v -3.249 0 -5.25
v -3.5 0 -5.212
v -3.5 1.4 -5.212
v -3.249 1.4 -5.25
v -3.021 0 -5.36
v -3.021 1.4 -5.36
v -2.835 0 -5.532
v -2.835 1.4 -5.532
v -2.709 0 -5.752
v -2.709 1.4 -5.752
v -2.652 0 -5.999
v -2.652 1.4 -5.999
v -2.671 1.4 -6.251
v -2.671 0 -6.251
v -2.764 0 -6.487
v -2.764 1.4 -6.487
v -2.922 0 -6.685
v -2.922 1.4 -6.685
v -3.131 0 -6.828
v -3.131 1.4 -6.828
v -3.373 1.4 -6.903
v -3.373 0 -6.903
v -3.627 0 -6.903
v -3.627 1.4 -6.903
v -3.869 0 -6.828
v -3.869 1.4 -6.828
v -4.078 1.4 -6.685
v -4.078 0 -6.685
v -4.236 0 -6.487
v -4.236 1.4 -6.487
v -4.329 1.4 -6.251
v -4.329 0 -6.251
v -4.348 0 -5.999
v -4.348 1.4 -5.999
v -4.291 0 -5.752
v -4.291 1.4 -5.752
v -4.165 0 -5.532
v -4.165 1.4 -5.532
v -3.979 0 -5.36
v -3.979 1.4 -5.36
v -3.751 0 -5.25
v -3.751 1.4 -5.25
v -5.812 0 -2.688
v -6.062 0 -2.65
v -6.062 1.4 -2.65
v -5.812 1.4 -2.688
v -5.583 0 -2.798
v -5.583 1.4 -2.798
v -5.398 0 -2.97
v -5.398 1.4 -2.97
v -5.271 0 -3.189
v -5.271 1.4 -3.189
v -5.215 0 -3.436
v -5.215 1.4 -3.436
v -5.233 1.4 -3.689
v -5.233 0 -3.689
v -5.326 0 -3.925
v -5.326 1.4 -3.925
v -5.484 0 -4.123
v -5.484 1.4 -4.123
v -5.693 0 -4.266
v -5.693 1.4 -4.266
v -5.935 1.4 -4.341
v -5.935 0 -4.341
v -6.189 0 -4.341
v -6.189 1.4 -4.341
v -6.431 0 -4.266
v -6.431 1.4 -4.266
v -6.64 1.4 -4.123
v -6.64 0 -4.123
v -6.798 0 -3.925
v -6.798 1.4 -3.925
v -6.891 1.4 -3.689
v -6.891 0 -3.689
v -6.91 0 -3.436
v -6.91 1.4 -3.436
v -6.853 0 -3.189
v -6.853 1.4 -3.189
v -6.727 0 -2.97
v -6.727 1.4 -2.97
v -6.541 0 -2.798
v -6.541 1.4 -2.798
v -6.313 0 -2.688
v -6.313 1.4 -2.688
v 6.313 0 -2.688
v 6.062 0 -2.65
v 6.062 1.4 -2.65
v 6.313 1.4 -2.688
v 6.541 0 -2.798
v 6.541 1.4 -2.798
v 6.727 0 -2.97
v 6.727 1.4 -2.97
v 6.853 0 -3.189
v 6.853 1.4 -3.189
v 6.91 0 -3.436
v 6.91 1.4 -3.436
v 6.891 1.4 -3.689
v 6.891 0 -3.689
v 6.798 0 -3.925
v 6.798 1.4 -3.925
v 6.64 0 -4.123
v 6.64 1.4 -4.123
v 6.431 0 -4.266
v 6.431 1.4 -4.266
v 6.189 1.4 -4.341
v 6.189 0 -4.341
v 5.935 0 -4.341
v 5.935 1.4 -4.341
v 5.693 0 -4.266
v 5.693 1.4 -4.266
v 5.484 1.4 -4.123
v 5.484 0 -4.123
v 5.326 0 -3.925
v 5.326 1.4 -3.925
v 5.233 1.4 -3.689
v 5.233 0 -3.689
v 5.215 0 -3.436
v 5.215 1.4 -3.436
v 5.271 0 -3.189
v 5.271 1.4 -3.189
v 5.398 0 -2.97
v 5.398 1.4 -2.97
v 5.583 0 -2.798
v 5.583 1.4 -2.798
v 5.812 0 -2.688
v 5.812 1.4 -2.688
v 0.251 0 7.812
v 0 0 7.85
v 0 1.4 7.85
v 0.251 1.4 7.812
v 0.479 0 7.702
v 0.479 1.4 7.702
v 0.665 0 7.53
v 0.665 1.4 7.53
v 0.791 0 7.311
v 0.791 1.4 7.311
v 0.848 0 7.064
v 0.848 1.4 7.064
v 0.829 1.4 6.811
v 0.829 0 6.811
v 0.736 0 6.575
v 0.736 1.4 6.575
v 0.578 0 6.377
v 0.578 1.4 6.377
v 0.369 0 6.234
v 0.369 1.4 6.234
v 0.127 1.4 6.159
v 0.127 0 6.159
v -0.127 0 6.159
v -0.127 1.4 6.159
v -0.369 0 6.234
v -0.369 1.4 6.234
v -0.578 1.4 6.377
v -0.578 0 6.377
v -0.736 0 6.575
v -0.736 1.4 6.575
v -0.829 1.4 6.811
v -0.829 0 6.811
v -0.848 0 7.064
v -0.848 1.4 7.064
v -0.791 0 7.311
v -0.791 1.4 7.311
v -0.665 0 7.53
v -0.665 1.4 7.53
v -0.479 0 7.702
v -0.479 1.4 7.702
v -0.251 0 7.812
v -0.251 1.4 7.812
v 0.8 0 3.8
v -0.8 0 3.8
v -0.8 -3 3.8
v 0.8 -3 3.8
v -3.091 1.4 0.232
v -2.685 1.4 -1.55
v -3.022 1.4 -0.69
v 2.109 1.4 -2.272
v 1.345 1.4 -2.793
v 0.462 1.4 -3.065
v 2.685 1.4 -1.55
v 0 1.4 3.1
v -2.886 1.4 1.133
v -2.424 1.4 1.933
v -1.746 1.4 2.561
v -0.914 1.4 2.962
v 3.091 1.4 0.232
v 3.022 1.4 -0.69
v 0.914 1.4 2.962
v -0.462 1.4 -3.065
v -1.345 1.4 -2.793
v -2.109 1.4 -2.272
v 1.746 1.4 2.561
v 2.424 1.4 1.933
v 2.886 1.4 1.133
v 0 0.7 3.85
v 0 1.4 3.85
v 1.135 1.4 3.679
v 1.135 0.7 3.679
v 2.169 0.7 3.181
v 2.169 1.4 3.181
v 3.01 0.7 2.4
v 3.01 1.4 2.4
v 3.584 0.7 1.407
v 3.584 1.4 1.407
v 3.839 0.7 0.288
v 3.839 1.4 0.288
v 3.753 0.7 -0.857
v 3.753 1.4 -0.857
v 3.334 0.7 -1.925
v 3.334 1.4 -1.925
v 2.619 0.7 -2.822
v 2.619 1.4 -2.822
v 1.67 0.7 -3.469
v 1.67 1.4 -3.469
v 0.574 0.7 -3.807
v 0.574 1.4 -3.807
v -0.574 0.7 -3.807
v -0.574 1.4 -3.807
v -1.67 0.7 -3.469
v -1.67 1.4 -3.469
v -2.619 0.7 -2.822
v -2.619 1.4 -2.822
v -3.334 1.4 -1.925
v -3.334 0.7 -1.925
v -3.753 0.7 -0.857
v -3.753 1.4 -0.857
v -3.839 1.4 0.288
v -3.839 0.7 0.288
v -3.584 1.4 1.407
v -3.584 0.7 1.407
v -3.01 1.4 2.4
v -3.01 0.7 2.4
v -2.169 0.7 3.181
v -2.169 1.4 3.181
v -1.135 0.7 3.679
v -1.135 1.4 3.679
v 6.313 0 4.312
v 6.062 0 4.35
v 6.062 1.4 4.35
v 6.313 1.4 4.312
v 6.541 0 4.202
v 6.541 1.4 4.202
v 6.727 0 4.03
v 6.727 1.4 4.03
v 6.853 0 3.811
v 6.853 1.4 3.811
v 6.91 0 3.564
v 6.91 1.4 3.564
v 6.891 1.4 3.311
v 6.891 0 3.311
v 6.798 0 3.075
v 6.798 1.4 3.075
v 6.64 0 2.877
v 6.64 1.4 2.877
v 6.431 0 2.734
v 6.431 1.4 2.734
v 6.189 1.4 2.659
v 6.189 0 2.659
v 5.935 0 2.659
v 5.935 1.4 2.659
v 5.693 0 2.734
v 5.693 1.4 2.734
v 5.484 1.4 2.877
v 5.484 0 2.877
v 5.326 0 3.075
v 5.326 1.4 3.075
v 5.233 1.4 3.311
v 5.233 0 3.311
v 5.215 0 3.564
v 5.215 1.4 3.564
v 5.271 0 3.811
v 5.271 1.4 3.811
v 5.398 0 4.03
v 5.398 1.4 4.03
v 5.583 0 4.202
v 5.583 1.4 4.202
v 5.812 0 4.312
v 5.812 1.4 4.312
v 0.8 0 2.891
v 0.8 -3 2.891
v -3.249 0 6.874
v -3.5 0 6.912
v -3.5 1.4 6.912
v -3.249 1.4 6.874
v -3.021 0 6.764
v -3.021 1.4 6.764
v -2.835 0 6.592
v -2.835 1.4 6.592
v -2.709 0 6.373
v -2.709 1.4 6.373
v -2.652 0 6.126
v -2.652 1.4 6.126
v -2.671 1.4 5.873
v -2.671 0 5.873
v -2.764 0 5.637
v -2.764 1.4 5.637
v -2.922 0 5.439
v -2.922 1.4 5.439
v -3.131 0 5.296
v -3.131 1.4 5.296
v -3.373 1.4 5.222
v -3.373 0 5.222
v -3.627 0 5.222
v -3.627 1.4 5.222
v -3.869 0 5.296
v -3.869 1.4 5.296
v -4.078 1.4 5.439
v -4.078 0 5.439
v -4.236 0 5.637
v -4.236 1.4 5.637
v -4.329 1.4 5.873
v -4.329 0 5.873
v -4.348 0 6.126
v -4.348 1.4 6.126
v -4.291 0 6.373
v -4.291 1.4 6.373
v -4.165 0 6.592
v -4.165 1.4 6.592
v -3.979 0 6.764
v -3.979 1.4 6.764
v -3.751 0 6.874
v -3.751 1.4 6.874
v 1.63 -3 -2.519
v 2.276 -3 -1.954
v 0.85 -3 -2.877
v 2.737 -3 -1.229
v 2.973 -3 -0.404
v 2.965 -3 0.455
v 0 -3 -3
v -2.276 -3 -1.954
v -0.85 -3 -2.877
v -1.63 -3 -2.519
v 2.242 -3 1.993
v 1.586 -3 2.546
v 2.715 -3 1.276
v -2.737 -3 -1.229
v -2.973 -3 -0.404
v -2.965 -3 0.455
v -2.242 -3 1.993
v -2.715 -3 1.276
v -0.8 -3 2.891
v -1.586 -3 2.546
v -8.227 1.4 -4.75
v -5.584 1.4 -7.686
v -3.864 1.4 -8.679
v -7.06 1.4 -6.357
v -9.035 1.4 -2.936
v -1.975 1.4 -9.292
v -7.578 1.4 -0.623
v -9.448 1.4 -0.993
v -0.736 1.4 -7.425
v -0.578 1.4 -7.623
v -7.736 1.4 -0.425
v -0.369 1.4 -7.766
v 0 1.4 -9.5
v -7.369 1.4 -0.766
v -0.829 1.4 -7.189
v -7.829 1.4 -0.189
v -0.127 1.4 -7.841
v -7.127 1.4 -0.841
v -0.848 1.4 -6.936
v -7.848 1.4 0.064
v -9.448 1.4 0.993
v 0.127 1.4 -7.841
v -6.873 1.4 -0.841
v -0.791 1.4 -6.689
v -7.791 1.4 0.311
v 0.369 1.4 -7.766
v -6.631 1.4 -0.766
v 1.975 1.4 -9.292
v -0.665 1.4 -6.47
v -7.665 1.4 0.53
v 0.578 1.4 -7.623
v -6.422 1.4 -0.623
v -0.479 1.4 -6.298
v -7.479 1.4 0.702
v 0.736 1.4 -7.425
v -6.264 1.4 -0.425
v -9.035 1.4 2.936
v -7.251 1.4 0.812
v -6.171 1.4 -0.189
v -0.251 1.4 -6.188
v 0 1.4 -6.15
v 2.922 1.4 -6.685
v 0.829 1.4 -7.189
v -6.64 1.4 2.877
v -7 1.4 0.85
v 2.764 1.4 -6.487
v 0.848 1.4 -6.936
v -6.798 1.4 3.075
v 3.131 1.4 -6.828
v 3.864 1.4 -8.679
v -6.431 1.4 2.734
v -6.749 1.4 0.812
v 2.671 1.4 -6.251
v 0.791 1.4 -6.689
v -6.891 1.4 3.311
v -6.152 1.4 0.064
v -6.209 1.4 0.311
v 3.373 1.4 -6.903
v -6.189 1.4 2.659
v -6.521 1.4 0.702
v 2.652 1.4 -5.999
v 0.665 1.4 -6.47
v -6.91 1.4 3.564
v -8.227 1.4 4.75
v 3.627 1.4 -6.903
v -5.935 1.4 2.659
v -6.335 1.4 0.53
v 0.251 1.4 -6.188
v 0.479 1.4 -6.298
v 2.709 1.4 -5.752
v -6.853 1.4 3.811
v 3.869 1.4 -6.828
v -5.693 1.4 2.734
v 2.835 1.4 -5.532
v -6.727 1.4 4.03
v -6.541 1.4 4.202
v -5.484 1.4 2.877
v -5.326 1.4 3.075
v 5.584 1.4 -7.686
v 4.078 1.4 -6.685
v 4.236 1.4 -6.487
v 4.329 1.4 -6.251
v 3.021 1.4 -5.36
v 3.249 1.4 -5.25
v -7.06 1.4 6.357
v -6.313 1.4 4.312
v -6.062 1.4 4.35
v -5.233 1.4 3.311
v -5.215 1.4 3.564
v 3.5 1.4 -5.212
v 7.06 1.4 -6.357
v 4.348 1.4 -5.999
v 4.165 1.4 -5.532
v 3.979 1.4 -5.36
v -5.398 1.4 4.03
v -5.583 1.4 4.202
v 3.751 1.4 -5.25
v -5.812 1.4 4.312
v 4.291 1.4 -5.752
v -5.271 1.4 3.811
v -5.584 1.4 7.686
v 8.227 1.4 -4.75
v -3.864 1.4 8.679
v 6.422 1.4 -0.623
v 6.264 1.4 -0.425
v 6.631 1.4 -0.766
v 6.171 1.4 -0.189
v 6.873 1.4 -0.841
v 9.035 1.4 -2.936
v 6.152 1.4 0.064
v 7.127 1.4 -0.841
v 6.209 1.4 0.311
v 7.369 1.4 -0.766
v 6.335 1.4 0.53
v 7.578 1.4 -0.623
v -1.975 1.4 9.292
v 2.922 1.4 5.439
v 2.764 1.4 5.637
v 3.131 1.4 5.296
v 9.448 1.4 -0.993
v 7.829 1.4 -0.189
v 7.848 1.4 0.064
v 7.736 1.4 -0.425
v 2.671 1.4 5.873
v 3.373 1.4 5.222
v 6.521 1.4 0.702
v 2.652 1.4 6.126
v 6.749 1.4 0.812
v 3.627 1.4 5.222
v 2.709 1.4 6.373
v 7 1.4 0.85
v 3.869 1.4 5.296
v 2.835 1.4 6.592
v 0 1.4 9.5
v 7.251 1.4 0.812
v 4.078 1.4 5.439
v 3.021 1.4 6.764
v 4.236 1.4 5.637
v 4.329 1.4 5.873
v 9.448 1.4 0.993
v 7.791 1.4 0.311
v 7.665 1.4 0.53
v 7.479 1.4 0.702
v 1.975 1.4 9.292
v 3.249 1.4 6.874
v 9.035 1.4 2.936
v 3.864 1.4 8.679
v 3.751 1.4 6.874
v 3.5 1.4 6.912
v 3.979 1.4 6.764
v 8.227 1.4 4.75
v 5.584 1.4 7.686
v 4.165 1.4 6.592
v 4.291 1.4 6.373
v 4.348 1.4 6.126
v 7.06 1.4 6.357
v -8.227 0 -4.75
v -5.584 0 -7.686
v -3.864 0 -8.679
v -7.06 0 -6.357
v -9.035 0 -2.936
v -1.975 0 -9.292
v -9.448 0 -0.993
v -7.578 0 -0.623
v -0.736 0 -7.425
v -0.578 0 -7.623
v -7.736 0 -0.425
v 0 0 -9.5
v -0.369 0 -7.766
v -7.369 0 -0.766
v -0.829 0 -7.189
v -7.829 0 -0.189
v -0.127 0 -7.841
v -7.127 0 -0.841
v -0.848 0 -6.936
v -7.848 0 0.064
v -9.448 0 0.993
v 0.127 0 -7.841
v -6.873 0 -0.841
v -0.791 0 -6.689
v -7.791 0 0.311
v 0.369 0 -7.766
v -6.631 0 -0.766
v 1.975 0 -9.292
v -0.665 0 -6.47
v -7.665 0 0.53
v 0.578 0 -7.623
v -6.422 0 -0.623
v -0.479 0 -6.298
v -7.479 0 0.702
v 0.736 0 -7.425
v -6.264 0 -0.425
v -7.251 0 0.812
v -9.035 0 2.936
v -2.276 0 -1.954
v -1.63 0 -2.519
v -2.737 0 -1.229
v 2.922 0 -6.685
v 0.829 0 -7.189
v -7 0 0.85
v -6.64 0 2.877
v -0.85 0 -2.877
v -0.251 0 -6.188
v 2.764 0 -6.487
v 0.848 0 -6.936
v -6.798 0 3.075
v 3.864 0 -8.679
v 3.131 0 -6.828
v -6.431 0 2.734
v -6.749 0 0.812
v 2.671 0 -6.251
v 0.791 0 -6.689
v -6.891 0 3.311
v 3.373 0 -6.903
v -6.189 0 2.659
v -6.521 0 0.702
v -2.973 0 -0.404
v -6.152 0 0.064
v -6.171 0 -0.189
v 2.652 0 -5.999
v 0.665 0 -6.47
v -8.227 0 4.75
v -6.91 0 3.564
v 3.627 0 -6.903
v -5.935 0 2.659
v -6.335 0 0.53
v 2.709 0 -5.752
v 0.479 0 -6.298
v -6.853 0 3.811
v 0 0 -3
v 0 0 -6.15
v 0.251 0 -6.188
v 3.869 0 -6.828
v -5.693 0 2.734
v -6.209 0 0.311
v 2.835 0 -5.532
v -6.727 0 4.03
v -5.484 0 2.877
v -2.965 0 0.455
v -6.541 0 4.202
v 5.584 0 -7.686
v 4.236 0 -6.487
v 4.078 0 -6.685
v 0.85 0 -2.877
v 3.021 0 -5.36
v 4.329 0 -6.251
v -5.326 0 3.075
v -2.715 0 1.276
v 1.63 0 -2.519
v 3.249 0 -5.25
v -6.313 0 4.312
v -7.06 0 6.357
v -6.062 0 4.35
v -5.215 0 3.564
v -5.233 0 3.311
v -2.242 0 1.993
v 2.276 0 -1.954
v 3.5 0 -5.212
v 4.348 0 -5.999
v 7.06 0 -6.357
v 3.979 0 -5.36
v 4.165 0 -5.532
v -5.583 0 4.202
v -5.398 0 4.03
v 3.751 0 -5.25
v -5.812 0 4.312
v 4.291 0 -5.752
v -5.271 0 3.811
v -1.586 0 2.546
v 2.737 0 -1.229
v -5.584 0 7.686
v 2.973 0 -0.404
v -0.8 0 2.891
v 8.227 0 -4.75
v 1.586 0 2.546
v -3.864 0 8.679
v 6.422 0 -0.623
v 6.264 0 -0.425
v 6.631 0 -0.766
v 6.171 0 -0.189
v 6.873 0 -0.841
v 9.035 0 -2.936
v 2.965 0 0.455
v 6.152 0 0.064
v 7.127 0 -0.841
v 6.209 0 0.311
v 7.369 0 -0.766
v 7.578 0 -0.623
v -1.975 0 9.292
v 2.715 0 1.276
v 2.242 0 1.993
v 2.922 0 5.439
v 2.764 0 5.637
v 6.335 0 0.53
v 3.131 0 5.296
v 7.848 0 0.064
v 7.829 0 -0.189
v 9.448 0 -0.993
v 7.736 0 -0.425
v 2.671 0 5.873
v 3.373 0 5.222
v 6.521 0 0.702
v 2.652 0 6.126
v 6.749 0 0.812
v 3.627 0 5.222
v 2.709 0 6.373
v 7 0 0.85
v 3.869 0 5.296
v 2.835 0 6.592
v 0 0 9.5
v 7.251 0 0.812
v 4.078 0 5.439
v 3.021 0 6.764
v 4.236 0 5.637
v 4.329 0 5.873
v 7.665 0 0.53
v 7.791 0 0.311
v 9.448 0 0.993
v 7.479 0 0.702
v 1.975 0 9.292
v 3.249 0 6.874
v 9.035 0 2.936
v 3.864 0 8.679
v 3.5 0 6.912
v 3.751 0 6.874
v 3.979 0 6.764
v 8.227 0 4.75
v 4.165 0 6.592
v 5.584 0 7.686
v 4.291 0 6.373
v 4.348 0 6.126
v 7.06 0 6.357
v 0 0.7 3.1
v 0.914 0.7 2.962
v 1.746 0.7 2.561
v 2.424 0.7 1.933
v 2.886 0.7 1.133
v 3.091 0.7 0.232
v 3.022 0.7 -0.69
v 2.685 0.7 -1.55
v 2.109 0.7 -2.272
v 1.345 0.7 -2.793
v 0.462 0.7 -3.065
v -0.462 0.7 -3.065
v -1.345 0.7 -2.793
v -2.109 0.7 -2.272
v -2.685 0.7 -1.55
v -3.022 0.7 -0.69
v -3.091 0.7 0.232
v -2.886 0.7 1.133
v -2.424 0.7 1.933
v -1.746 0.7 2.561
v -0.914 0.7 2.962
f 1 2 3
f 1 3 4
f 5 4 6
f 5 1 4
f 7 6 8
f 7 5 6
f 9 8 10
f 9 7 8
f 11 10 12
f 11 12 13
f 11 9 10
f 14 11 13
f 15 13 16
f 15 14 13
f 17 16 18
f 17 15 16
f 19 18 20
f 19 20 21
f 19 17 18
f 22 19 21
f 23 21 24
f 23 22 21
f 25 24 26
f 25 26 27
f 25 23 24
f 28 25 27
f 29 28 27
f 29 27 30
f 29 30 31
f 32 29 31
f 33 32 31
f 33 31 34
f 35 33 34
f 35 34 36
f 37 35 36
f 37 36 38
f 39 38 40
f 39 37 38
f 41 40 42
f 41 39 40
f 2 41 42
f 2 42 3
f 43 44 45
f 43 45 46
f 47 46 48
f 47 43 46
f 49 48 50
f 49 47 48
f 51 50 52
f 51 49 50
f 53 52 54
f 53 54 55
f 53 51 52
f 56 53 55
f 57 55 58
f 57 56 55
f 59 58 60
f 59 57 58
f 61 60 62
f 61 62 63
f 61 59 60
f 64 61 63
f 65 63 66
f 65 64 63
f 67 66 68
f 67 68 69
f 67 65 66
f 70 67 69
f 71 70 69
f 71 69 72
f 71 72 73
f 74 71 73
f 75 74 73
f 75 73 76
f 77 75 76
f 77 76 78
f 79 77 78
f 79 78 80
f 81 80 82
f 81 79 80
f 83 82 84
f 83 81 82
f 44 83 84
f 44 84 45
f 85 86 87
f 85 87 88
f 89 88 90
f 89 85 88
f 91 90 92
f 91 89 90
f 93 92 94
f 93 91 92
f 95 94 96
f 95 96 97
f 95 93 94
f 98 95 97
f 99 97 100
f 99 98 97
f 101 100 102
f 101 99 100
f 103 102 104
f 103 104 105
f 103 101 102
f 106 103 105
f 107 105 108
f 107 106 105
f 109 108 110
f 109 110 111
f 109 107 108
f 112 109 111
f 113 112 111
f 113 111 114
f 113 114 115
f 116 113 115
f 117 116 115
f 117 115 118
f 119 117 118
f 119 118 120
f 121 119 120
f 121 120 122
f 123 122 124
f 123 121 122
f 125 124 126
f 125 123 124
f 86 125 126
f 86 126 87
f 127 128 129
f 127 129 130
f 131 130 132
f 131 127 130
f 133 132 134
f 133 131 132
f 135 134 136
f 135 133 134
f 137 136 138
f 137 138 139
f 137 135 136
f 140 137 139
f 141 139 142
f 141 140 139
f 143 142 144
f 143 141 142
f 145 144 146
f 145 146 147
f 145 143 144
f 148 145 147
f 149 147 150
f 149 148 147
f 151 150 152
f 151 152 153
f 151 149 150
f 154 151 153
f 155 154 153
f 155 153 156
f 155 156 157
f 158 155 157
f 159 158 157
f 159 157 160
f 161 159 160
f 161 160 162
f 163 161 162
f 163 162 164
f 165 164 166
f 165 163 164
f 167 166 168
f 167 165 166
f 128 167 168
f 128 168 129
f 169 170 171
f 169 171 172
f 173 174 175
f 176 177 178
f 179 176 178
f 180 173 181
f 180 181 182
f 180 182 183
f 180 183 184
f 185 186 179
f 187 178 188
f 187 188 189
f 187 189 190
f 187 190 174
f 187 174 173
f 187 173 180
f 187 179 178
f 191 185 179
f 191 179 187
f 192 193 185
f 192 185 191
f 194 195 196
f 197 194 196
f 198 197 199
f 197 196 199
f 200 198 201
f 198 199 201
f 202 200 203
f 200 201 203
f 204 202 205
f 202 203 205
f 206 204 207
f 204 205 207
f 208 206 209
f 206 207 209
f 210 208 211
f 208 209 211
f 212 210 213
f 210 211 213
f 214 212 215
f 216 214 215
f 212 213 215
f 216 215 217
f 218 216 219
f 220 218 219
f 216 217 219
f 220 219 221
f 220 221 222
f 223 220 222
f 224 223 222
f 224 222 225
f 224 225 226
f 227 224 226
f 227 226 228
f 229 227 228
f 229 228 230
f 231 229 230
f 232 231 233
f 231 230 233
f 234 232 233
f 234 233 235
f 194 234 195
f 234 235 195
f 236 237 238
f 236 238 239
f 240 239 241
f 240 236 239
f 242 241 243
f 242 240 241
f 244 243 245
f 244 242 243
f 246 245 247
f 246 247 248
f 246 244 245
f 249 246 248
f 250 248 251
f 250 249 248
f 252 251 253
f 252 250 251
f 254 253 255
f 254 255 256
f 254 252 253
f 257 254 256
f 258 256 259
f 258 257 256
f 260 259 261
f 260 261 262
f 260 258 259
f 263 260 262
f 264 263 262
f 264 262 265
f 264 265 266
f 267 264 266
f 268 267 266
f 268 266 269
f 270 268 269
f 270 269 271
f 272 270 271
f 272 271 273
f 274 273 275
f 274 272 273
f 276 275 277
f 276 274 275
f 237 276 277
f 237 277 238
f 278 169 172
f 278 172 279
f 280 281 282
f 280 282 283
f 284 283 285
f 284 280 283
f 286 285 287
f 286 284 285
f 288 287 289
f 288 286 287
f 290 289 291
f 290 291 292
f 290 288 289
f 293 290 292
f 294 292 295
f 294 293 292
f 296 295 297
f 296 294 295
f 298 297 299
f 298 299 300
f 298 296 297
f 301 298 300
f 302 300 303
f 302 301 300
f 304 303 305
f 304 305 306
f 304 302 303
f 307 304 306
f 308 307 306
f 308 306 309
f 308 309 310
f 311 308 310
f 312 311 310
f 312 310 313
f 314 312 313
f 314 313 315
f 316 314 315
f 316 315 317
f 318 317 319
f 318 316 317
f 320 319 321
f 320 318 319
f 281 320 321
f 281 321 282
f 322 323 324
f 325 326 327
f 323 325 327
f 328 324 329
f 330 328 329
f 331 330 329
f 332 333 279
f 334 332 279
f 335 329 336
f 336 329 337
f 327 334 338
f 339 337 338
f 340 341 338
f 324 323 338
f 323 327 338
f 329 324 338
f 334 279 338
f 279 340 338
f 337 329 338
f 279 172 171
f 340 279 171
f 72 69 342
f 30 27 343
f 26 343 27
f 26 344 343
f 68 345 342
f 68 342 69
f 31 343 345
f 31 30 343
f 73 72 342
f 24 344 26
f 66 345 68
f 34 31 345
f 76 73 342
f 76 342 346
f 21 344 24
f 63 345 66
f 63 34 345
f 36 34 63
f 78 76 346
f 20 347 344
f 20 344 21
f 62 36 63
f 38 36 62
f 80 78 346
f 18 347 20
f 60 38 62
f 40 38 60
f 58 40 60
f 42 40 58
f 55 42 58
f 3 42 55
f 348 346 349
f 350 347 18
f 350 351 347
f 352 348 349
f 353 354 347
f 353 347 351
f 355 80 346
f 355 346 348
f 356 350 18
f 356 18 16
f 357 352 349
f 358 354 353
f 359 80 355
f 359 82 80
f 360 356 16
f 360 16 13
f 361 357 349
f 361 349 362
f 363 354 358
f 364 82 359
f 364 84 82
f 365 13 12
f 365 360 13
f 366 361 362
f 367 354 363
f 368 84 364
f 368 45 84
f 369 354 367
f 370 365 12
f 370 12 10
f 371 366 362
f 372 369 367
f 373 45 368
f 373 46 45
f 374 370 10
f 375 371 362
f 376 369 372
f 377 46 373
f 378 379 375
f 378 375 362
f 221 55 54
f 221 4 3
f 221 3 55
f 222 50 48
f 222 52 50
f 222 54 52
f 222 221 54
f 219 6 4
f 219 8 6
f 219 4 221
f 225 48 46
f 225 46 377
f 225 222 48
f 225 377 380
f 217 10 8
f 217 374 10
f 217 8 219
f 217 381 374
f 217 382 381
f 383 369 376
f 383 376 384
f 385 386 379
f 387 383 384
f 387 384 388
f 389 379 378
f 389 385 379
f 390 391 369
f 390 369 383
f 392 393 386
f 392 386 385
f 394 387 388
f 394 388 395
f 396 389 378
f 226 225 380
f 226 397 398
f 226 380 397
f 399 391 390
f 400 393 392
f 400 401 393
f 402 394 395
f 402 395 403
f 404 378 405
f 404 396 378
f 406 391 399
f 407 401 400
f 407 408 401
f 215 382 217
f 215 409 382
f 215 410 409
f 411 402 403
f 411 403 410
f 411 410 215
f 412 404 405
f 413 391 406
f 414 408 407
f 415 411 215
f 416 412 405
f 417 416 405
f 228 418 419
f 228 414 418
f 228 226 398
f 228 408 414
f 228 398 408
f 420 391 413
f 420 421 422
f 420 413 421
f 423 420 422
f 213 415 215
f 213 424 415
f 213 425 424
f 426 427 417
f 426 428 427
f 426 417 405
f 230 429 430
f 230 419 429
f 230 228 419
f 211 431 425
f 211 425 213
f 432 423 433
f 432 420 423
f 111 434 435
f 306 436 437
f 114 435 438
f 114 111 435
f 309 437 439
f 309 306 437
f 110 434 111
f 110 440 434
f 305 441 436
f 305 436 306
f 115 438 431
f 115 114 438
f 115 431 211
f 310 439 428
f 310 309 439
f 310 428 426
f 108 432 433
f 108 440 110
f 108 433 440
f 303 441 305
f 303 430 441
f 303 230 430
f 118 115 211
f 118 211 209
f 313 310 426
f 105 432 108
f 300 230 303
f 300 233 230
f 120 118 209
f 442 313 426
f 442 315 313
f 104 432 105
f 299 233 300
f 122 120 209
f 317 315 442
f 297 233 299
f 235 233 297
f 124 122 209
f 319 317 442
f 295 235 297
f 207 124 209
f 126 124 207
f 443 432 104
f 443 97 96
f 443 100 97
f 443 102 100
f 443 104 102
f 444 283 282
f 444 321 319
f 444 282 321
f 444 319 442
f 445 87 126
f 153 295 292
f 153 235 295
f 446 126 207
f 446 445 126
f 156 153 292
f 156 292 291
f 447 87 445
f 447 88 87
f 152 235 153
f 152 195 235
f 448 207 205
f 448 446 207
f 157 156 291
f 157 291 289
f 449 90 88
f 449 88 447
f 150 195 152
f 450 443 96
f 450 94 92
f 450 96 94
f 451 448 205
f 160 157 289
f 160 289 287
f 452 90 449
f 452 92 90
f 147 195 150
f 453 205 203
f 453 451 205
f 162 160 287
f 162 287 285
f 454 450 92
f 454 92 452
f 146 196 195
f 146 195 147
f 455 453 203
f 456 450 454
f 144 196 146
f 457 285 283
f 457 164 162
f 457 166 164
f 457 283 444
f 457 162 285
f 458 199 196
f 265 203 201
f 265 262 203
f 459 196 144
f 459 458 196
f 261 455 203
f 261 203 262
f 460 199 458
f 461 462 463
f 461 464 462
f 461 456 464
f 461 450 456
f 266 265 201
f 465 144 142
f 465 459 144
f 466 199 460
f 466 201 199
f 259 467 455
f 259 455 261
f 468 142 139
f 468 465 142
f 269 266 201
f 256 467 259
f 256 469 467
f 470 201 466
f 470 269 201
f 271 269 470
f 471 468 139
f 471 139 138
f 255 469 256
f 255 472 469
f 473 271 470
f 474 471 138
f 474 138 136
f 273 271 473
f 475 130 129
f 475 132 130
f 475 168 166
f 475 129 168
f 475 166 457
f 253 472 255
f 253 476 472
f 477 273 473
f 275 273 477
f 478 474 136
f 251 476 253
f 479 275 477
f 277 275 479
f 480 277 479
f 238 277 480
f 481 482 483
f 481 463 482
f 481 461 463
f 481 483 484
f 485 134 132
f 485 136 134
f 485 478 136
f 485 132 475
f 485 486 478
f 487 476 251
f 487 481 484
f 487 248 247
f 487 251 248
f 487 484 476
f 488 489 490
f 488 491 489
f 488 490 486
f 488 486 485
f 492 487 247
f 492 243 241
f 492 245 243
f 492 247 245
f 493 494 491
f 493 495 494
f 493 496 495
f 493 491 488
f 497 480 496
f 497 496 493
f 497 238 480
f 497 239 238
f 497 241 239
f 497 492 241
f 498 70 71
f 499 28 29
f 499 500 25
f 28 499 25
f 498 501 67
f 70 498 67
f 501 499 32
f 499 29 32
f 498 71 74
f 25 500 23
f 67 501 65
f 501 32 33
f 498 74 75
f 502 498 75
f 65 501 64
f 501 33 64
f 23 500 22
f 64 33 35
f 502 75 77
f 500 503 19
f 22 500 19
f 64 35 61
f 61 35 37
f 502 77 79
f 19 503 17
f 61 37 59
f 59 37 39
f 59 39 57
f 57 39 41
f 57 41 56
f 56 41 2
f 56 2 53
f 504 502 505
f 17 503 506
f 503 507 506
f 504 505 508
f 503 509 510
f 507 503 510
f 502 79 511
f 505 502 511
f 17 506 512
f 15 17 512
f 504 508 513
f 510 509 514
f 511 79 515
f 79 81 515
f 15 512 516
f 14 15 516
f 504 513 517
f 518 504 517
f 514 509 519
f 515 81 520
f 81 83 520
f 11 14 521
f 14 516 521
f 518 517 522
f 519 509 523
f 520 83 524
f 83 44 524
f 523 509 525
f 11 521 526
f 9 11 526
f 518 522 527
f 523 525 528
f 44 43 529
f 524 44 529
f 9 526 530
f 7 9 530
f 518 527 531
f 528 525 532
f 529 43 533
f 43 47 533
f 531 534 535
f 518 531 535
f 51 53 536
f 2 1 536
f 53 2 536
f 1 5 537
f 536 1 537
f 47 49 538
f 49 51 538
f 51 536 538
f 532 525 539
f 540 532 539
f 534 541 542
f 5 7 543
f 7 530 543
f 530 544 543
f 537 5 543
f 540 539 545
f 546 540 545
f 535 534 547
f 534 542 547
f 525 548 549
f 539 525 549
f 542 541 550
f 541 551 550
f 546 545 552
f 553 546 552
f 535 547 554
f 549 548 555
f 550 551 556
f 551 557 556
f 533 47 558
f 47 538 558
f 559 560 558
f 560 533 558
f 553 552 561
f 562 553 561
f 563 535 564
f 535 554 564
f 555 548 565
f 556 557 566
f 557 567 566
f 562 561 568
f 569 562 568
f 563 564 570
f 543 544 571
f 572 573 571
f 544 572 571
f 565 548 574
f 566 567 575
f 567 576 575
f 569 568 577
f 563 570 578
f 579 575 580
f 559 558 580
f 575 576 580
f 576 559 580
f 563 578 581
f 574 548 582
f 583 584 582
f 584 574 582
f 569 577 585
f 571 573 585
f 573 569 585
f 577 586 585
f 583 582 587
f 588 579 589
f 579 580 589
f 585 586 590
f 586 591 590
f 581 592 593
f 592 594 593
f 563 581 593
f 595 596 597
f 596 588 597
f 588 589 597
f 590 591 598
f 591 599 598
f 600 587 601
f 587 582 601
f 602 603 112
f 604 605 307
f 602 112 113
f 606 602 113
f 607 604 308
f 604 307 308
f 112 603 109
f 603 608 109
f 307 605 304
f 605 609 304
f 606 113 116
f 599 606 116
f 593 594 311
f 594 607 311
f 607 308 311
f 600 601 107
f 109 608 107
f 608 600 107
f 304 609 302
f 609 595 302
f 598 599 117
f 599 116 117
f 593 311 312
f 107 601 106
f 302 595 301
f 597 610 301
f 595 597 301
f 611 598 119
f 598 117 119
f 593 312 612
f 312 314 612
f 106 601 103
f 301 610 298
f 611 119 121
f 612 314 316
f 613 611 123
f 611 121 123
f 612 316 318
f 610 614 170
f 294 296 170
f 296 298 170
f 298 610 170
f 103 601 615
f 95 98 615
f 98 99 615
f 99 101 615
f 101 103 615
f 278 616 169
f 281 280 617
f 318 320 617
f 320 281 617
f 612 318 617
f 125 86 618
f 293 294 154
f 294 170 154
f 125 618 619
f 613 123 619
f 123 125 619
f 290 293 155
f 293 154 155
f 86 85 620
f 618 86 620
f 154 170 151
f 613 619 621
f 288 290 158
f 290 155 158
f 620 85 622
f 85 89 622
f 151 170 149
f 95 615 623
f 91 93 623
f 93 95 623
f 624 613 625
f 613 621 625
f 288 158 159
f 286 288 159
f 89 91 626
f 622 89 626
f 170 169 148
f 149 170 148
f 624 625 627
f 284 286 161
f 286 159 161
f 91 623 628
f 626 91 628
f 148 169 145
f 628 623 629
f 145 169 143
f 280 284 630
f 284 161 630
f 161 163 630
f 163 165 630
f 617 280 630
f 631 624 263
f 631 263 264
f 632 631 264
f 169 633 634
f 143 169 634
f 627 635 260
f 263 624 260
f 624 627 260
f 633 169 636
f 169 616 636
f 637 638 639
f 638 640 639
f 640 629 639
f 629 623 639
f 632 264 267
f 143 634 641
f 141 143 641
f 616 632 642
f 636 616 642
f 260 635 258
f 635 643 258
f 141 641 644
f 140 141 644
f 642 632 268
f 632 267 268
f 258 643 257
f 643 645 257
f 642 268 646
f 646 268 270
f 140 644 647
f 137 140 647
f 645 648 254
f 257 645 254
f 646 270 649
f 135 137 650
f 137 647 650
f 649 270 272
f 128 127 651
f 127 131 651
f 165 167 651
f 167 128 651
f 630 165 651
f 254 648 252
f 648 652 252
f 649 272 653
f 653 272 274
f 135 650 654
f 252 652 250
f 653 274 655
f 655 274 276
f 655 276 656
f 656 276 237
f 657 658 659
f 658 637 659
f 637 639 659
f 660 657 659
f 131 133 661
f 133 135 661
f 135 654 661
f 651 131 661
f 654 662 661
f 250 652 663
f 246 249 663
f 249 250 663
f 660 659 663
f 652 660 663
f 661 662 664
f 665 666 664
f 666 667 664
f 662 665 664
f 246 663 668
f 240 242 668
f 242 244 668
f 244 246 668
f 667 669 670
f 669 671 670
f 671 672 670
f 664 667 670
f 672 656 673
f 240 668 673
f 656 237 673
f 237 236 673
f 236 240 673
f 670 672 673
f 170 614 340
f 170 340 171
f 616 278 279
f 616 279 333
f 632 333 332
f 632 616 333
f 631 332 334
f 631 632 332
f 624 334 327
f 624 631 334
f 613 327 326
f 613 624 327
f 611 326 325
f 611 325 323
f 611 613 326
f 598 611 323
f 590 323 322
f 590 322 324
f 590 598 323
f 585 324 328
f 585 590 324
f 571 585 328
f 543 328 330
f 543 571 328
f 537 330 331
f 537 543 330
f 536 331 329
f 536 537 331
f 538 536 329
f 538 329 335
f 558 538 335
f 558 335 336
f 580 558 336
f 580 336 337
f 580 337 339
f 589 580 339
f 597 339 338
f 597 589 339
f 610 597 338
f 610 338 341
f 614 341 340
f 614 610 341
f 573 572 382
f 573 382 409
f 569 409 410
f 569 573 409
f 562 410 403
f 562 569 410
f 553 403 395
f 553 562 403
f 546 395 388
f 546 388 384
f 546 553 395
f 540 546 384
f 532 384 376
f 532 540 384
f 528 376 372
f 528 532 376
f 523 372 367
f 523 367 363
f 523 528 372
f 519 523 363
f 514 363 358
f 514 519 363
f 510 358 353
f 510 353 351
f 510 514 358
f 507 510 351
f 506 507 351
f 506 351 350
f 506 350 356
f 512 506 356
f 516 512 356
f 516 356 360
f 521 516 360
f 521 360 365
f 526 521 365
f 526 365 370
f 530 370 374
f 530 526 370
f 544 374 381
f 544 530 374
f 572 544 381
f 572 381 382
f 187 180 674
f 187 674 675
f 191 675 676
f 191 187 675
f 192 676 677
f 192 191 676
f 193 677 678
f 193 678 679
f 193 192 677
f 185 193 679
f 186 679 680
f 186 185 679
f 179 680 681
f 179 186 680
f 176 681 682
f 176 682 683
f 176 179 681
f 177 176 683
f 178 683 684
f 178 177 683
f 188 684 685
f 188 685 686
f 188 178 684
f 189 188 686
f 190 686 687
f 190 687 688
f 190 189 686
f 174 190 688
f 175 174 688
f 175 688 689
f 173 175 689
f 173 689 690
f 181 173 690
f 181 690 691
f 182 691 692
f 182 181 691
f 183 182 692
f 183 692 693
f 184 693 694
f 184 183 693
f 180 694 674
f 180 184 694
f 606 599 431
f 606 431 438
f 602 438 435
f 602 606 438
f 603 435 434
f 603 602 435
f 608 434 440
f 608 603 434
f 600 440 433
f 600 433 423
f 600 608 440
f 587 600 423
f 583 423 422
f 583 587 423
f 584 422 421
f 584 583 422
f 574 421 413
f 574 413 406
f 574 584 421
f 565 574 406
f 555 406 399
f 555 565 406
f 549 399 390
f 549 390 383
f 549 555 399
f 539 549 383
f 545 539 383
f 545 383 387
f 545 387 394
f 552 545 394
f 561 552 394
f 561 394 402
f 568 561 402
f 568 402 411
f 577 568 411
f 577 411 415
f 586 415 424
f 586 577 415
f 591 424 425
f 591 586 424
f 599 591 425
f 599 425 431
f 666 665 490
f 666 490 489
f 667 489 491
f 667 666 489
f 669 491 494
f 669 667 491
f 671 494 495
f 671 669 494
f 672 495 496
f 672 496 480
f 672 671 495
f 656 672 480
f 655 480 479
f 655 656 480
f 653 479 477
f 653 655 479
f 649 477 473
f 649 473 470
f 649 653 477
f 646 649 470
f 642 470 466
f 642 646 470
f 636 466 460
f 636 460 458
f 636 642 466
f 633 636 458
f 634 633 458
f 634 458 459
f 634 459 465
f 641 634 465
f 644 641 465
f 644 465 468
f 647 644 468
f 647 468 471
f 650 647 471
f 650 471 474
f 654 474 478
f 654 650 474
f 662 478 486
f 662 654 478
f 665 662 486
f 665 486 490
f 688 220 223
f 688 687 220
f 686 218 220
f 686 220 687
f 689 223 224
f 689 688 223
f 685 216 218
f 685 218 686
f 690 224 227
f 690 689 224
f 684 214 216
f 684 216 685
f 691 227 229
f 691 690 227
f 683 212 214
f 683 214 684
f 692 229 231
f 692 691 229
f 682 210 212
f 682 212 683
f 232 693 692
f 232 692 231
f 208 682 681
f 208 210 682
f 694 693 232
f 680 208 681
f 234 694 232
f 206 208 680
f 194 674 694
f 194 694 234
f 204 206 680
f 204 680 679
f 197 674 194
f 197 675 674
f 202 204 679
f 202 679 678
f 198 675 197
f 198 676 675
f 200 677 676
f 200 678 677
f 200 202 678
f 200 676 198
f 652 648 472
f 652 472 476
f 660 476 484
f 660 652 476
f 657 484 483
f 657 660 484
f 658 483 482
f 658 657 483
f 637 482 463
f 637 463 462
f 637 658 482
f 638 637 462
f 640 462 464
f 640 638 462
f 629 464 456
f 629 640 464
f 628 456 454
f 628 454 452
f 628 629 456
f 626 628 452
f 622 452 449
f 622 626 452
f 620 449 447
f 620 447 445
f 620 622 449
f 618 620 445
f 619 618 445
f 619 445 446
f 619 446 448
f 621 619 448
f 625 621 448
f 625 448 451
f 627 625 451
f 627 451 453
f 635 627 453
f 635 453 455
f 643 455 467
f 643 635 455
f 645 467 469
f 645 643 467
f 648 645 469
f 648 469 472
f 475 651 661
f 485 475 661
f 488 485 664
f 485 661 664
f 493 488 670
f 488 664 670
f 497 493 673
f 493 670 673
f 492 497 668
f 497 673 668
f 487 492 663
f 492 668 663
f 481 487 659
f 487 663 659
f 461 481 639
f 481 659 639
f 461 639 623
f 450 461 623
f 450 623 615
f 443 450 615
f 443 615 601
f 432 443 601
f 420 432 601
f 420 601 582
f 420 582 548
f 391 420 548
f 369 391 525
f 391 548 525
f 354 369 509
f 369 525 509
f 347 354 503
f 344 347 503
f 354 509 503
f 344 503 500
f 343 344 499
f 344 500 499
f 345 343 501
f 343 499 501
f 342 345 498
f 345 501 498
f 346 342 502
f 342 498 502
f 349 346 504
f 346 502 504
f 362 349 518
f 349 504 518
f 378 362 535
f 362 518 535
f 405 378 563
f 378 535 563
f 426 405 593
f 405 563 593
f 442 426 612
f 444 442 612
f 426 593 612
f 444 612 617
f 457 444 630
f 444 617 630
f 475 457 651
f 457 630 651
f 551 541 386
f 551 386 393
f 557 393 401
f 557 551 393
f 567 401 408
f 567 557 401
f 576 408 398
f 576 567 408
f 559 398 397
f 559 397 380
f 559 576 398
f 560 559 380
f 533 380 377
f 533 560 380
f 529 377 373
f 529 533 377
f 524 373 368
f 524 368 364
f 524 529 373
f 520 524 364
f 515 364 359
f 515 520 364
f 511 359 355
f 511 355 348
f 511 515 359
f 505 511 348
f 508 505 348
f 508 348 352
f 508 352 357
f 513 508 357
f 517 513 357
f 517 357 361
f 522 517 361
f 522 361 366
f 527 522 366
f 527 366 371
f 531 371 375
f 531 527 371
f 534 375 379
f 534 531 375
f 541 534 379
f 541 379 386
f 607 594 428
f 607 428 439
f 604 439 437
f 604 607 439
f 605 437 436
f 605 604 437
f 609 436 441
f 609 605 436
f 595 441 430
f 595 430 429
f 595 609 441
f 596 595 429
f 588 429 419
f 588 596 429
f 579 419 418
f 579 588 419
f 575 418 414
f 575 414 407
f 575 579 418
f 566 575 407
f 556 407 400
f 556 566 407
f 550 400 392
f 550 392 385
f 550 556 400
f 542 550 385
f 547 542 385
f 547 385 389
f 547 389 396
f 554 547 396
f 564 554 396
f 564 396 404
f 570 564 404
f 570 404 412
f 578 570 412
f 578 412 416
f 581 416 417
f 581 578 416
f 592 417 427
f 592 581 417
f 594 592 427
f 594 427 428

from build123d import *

# Parameters (mm, degrees)
SKETCH_1_R          = 9.5
SKETCH_1_R_2        = 0.85
EXTRUDE_1_DEPTH     = 1.4
SKETCH_2_R          = 3.85
SKETCH_2_R_2        = 3.1
CUT_EXTRUDE_1_DEPTH = 0.7
EXTRUDE_2_DEPTH     = 3


with BuildPart() as part:
    # 스케치1 → 보스-돌출1 (new body)
    with BuildSketch(Plane(origin=(0, 0, 0), x_dir=(1, 0, 0), z_dir=(0, 1, 0))):
        with Locations(Location((0, 0, 0), (0, 0, 270))):
            Circle(SKETCH_1_R)
        with Locations(Location((0, 7, 0), (0, 0, 270))):
            Circle(SKETCH_1_R_2, mode=Mode.SUBTRACT)
        with Locations(Location((3.5, 6.062177826, 0), (0, 0, 270))):
            Circle(SKETCH_1_R_2, mode=Mode.SUBTRACT)
        with Locations(Location((6.062177826, 3.5, 0), (0, 0, 270))):
            Circle(SKETCH_1_R_2, mode=Mode.SUBTRACT)
        with Locations(Location((7, 0, 0), (0, 0, 270))):
            Circle(SKETCH_1_R_2, mode=Mode.SUBTRACT)
        with Locations(Location((6.062177826, -3.5, 0), (0, 0, 270))):
            Circle(SKETCH_1_R_2, mode=Mode.SUBTRACT)
        with Locations(Location((3.5, -6.062177826, 0), (0, 0, 270))):
            Circle(SKETCH_1_R_2, mode=Mode.SUBTRACT)
        with Locations(Location((0, -7, 0), (0, 0, 270))):
            Circle(SKETCH_1_R_2, mode=Mode.SUBTRACT)
        with Locations(Location((-3.5, -6.062177826, 0), (0, 0, 270))):
            Circle(SKETCH_1_R_2, mode=Mode.SUBTRACT)
        with Locations(Location((-6.062177826, -3.5, 0), (0, 0, 270))):
            Circle(SKETCH_1_R_2, mode=Mode.SUBTRACT)
        with Locations(Location((-7, 0, 0), (0, 0, 270))):
            Circle(SKETCH_1_R_2, mode=Mode.SUBTRACT)
        with Locations(Location((-6.062177826, 3.5, 0), (0, 0, 270))):
            Circle(SKETCH_1_R_2, mode=Mode.SUBTRACT)
        with Locations(Location((-3.5, 6.062177826, 0), (0, 0, 270))):
            Circle(SKETCH_1_R_2, mode=Mode.SUBTRACT)
    extrude(amount=EXTRUDE_1_DEPTH)

    # 스케치2 → 컷-돌출1 (cut)
    with BuildSketch(Plane(origin=(0, 1.4, 0), x_dir=(1, 0, 0), z_dir=(0, 1, 0))):
        with Locations(Location((0, 0, 0), (0, 0, 270))):
            Circle(SKETCH_2_R)
        with Locations(Location((0, 0, 0), (0, 0, 270))):
            Circle(SKETCH_2_R_2, mode=Mode.SUBTRACT)
    extrude(amount=-CUT_EXTRUDE_1_DEPTH, mode=Mode.SUBTRACT)

    # 스케치3 → 보스-돌출2 (add)
    with BuildSketch(Plane.XZ):
        with BuildLine():
            Line((-0.8, 2.891366459), (-0.8, 3.8))
            Line((-0.8, 3.8), (0.8, 3.8))
            Line((0.8, 3.8), (0.8, 2.891366459))
            ThreePointArc((0.8, 2.891366459), (0, -3), (-0.8, 2.891366459))
        make_face()
    extrude(amount=EXTRUDE_2_DEPTH)


solid = part.part
